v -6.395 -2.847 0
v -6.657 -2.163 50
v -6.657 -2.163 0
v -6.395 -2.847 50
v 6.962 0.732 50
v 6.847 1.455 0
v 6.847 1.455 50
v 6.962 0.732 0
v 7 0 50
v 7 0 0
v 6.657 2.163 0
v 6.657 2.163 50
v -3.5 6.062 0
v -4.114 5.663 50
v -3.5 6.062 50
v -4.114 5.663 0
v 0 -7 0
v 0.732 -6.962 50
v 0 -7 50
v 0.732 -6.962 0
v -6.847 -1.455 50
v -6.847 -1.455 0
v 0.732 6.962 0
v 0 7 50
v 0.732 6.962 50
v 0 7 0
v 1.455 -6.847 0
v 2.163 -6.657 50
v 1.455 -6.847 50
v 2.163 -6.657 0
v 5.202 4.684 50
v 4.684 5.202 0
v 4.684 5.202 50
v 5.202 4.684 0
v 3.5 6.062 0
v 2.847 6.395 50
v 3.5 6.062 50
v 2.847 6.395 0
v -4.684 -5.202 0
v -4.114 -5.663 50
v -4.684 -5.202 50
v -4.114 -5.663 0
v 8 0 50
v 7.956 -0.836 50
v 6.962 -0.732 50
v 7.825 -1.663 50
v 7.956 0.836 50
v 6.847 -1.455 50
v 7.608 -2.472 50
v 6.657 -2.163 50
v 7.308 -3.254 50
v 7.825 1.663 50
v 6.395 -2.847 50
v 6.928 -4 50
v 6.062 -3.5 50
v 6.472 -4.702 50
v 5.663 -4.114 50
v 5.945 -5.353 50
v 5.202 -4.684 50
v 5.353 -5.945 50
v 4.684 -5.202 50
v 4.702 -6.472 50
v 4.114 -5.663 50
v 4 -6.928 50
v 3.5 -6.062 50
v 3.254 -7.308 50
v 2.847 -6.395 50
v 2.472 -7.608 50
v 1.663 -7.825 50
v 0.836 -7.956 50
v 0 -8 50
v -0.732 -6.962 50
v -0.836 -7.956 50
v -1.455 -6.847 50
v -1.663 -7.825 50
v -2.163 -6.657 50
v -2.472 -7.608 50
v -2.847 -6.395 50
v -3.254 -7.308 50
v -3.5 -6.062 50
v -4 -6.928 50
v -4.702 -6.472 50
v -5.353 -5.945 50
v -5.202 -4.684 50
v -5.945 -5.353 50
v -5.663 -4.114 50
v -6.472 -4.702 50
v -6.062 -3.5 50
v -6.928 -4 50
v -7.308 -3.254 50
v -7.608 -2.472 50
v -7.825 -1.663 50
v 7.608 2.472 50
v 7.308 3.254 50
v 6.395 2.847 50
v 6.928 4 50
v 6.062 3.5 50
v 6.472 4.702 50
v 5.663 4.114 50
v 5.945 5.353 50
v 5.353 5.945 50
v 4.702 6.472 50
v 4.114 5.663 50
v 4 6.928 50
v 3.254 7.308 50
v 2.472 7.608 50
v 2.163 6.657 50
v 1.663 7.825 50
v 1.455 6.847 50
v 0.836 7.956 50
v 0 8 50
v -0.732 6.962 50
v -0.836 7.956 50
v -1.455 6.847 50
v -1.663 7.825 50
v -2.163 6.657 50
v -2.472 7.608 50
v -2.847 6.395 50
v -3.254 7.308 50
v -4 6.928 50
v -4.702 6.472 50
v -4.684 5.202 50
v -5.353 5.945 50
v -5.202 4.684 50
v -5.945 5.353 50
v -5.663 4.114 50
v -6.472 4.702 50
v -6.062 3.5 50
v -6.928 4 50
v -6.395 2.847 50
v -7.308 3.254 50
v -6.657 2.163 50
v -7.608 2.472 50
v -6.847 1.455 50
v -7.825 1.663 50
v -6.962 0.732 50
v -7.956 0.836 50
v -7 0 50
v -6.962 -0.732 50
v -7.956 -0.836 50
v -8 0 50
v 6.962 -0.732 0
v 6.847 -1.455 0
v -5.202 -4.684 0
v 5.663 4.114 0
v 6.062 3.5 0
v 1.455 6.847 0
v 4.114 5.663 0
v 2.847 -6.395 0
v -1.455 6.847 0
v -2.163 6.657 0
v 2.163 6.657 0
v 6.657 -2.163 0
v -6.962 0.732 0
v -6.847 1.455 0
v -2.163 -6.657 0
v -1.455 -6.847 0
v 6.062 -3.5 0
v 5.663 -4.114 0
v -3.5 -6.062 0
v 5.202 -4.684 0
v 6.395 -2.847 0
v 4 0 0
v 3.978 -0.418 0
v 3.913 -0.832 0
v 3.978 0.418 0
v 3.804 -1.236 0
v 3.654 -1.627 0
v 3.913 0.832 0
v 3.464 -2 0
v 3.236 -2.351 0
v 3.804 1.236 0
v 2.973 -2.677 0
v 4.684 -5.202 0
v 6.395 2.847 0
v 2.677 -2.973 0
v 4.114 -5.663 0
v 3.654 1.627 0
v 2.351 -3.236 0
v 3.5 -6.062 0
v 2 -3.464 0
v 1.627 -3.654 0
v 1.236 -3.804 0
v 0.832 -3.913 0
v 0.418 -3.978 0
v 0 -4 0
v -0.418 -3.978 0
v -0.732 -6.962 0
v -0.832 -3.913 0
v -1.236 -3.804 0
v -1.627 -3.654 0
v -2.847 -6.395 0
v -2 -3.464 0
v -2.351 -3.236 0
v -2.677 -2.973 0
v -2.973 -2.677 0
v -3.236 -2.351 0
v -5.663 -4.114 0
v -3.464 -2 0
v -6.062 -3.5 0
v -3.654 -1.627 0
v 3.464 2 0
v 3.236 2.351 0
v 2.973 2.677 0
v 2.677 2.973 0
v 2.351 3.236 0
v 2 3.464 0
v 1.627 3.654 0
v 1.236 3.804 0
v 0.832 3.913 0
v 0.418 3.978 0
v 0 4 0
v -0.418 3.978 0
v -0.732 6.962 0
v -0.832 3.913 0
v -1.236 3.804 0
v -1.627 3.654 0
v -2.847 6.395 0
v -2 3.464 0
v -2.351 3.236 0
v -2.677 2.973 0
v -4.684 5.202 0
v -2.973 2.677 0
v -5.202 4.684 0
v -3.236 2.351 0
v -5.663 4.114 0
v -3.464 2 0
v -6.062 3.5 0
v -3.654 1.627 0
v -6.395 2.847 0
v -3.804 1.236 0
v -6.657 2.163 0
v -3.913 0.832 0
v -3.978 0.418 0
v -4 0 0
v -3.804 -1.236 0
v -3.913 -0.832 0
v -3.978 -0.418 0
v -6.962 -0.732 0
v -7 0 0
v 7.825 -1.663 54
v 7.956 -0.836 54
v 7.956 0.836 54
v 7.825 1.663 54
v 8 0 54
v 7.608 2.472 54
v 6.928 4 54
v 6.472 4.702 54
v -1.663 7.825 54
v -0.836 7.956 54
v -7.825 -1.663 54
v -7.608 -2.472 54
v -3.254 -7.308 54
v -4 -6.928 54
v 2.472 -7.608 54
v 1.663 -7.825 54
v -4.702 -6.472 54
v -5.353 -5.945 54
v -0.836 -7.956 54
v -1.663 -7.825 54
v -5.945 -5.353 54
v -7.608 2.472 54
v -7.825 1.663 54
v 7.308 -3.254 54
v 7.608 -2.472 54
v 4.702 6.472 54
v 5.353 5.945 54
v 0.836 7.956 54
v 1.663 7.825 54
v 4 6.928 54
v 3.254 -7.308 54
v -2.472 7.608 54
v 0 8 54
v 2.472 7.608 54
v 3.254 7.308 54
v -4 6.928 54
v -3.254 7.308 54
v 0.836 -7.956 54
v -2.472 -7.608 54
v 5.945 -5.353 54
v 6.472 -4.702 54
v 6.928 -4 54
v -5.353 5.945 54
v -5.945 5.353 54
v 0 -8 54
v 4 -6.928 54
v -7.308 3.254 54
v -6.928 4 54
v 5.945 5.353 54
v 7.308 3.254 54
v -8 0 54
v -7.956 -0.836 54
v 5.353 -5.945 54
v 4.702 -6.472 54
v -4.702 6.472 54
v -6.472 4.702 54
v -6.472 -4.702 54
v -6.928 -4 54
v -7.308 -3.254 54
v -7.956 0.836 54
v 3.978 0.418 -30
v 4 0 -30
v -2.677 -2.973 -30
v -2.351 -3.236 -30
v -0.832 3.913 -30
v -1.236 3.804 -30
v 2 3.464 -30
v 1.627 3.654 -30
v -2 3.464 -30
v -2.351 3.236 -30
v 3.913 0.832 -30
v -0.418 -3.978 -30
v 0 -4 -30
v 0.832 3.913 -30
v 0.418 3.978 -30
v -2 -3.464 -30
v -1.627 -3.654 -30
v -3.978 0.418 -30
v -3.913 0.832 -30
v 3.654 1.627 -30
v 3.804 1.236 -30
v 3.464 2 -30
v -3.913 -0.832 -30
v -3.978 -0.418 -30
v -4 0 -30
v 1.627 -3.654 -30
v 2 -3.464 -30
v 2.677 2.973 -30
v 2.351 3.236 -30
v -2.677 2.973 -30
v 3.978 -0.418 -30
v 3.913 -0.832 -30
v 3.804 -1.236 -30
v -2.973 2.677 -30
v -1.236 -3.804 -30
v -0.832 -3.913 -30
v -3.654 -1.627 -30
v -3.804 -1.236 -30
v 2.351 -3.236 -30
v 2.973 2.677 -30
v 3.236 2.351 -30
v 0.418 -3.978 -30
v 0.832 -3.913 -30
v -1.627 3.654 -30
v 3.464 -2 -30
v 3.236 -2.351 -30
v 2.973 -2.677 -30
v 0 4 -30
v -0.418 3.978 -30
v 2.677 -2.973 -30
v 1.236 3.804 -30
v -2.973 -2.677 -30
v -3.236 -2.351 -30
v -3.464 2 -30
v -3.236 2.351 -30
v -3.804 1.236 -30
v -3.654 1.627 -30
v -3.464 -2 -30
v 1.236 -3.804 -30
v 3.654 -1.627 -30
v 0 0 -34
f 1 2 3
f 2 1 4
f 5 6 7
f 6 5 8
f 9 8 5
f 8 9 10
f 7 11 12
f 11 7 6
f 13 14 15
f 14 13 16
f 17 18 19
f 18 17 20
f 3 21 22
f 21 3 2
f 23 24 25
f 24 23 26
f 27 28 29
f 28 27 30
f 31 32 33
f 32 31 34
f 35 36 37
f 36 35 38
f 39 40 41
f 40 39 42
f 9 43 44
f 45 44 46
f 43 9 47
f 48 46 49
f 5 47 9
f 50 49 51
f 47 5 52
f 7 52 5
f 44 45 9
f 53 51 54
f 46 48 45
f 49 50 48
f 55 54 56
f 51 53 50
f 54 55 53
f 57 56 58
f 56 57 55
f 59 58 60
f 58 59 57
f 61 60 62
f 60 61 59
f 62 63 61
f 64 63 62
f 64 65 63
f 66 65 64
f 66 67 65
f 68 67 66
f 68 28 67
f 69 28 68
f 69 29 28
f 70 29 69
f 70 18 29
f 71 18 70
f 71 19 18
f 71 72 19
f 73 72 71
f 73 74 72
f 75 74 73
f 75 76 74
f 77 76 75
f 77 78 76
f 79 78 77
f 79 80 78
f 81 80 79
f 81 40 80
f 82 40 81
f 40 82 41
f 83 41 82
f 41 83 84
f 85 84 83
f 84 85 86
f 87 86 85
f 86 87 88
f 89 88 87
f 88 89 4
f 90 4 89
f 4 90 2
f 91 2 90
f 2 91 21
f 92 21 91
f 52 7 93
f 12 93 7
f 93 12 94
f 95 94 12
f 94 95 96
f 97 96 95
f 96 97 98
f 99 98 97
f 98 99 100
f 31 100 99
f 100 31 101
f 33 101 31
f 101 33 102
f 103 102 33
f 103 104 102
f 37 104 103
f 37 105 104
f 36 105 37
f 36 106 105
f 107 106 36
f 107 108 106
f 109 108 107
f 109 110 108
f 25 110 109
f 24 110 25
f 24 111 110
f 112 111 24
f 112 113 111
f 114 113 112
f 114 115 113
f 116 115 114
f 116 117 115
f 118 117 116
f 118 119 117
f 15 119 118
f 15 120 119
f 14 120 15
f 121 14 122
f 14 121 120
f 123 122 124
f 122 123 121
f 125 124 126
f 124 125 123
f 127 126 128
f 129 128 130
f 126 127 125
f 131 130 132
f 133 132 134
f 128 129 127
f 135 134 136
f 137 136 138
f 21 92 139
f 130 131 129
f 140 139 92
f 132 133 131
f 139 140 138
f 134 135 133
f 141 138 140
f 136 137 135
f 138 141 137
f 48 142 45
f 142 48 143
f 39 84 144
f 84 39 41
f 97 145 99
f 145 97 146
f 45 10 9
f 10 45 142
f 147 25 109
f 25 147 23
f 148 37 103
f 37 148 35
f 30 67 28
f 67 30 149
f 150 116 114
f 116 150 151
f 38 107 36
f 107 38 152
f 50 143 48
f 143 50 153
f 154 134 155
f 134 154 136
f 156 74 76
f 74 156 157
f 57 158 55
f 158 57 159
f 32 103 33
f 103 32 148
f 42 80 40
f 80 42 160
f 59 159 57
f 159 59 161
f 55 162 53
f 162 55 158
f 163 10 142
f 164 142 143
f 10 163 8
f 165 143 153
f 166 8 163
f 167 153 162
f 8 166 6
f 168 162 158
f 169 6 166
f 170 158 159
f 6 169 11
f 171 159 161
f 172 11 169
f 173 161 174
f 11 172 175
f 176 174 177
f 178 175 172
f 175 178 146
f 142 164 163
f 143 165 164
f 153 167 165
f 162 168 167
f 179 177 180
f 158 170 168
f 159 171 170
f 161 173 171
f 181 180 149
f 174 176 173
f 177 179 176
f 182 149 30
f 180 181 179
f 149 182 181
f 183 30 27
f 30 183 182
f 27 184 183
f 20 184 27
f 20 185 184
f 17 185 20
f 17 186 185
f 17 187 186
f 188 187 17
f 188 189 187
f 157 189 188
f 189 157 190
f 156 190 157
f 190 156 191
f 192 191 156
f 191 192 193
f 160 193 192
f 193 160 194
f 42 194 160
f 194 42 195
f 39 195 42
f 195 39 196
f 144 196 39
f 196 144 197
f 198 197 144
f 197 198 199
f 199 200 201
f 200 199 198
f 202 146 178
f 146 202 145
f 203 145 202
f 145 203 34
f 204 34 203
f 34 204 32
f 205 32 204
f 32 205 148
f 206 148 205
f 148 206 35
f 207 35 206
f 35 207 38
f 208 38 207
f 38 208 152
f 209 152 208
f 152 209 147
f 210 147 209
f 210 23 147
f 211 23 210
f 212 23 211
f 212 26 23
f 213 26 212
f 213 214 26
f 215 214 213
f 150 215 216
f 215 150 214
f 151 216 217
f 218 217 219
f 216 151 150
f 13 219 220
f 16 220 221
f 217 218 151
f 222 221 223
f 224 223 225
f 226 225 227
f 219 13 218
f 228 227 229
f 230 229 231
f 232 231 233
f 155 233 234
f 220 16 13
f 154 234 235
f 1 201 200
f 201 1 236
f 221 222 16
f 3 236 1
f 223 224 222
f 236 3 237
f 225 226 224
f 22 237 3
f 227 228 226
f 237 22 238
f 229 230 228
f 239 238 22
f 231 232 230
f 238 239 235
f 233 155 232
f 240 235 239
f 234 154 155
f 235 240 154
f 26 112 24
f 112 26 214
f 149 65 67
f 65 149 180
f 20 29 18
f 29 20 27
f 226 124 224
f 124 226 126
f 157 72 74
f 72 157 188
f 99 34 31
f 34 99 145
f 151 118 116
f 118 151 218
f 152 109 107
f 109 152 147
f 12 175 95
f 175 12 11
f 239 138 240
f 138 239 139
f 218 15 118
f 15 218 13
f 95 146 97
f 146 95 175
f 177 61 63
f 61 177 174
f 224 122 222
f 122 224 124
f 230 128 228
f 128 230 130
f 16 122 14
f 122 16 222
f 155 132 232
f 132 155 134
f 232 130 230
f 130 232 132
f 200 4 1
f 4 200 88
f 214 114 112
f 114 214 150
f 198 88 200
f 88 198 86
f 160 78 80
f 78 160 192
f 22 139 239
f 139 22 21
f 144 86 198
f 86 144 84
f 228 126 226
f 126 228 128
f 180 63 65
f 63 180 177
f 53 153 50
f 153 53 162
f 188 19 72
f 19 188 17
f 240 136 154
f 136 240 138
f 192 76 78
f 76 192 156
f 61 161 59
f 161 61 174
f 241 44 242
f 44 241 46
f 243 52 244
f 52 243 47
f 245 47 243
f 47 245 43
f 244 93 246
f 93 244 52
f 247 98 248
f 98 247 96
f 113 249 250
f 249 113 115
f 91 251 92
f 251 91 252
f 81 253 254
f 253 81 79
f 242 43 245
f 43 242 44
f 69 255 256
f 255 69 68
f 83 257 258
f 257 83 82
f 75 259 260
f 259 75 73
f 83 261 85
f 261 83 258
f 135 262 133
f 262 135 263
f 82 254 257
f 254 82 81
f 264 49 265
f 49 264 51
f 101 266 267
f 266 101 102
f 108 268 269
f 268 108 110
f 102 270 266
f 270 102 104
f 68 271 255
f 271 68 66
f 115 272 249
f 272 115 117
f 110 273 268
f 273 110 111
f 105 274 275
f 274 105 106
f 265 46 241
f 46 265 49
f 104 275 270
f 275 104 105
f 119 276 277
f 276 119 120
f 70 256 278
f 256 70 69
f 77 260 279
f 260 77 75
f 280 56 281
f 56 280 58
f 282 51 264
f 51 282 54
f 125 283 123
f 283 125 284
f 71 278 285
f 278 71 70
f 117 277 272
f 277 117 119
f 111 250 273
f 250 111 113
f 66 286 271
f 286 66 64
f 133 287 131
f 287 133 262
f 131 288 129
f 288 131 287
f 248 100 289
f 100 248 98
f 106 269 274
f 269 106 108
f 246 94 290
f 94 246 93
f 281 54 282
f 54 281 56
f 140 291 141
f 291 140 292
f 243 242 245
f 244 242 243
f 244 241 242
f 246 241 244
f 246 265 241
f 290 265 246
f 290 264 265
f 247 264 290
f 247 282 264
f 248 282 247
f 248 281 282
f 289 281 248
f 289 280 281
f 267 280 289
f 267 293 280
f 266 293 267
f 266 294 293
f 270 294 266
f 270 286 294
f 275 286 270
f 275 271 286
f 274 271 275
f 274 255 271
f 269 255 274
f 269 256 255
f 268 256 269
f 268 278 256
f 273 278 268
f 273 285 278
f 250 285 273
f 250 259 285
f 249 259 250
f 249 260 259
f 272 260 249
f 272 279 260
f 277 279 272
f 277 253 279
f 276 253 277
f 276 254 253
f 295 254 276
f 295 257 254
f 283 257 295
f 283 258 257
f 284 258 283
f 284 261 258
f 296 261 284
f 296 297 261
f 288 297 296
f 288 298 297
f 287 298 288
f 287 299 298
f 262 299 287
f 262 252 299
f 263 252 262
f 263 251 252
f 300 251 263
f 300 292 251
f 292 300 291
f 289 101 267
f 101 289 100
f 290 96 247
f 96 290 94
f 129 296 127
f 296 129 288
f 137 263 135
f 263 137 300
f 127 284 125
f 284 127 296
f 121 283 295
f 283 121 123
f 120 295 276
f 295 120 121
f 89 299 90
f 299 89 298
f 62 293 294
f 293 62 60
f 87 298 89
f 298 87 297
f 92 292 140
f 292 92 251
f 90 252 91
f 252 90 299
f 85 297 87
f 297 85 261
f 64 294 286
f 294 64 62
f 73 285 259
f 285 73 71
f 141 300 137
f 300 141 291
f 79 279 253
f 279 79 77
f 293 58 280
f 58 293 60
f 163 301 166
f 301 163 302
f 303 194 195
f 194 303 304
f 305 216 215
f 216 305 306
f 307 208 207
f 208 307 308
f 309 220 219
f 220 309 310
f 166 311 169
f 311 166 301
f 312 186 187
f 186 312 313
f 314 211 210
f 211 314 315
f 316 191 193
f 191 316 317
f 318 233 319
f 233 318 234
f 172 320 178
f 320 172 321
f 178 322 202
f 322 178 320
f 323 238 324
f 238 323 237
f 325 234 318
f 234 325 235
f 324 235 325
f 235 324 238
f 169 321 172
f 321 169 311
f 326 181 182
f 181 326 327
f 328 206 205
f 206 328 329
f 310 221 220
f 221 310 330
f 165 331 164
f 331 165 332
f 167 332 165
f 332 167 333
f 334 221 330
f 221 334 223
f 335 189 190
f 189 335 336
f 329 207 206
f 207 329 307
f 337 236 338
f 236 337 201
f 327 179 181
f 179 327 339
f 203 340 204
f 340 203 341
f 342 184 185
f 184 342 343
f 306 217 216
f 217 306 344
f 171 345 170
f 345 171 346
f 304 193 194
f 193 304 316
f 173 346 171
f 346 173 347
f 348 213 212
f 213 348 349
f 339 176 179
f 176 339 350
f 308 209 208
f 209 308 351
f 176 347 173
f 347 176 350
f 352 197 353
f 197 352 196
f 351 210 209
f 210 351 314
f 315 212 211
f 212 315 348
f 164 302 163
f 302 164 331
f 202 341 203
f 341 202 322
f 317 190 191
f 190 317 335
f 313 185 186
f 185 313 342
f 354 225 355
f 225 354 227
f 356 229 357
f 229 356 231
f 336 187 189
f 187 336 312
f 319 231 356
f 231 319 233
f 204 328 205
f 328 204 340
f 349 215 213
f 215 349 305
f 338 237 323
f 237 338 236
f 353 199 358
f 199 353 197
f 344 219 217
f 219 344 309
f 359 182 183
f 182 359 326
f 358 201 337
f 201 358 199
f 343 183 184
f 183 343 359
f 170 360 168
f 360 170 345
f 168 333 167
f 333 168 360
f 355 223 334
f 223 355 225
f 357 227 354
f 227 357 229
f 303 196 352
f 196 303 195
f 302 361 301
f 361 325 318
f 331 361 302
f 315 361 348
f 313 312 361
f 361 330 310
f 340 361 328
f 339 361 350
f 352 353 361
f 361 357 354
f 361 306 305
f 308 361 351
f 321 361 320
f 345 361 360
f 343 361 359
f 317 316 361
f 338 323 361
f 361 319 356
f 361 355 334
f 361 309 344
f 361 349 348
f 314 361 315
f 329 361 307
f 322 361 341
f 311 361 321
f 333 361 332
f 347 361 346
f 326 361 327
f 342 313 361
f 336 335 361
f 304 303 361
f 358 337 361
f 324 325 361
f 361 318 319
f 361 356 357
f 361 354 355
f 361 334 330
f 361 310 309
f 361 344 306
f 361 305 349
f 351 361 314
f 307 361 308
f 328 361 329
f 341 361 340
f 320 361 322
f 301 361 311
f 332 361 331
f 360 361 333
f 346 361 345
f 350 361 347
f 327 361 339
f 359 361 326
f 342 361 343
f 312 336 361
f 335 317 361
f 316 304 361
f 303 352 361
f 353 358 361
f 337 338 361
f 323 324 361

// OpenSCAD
// file: _common.scad
// mechanism 共用設定 + 齒輪 module
$fn = 60;

// 簡化齒輪：N 個齒、節圓半徑 r、齒高 h、齒寬 w
module simple_gear(N = 16, r = 20, h = 4, thick = 6) {
  union() {
    // 主圓盤
    cylinder(h = thick, r = r, center = true);
    // 齒（梯形）
    for (i = [0:N-1]) {
      rotate([0, 0, i * 360 / N])
        translate([r, 0, 0])
          linear_extrude(height = thick, center = true)
            polygon([[0, -2.4], [h, -1.4], [h, 1.4], [0, 2.4]]);
    }
    // 中心凸軸
    cylinder(h = thick * 1.4, r = r * 0.18, center = true);
  }
}
// main file
// 衝具 Punch — 中心衝（圓柱身 + 滾花握把 + 尖頭）
include <_common.scad>

// 握把（粗滾花）
color([0.55, 0.55, 0.58]) {
  cylinder(h = 50, r = 7);
  // 滾花紋（簡化為一圈圈淺溝）
}
// 端蓋
color([0.30, 0.30, 0.30])
  translate([0, 0, 50]) cylinder(h = 4, r = 8);

// 中段細圓柱
color([0.7, 0.7, 0.72])
  translate([0, 0, -30]) cylinder(h = 30, r = 4);

// 尖頭（圓錐）：中心衝尖端約 90°（圓錐高＝底半徑），2026-10 修正：原本 h=10 約 44°，是劃線用樣衝的角度
color([0.30, 0.30, 0.30])
  translate([0, 0, -34]) cylinder(h = 4, r1 = 0, r2 = 4);
